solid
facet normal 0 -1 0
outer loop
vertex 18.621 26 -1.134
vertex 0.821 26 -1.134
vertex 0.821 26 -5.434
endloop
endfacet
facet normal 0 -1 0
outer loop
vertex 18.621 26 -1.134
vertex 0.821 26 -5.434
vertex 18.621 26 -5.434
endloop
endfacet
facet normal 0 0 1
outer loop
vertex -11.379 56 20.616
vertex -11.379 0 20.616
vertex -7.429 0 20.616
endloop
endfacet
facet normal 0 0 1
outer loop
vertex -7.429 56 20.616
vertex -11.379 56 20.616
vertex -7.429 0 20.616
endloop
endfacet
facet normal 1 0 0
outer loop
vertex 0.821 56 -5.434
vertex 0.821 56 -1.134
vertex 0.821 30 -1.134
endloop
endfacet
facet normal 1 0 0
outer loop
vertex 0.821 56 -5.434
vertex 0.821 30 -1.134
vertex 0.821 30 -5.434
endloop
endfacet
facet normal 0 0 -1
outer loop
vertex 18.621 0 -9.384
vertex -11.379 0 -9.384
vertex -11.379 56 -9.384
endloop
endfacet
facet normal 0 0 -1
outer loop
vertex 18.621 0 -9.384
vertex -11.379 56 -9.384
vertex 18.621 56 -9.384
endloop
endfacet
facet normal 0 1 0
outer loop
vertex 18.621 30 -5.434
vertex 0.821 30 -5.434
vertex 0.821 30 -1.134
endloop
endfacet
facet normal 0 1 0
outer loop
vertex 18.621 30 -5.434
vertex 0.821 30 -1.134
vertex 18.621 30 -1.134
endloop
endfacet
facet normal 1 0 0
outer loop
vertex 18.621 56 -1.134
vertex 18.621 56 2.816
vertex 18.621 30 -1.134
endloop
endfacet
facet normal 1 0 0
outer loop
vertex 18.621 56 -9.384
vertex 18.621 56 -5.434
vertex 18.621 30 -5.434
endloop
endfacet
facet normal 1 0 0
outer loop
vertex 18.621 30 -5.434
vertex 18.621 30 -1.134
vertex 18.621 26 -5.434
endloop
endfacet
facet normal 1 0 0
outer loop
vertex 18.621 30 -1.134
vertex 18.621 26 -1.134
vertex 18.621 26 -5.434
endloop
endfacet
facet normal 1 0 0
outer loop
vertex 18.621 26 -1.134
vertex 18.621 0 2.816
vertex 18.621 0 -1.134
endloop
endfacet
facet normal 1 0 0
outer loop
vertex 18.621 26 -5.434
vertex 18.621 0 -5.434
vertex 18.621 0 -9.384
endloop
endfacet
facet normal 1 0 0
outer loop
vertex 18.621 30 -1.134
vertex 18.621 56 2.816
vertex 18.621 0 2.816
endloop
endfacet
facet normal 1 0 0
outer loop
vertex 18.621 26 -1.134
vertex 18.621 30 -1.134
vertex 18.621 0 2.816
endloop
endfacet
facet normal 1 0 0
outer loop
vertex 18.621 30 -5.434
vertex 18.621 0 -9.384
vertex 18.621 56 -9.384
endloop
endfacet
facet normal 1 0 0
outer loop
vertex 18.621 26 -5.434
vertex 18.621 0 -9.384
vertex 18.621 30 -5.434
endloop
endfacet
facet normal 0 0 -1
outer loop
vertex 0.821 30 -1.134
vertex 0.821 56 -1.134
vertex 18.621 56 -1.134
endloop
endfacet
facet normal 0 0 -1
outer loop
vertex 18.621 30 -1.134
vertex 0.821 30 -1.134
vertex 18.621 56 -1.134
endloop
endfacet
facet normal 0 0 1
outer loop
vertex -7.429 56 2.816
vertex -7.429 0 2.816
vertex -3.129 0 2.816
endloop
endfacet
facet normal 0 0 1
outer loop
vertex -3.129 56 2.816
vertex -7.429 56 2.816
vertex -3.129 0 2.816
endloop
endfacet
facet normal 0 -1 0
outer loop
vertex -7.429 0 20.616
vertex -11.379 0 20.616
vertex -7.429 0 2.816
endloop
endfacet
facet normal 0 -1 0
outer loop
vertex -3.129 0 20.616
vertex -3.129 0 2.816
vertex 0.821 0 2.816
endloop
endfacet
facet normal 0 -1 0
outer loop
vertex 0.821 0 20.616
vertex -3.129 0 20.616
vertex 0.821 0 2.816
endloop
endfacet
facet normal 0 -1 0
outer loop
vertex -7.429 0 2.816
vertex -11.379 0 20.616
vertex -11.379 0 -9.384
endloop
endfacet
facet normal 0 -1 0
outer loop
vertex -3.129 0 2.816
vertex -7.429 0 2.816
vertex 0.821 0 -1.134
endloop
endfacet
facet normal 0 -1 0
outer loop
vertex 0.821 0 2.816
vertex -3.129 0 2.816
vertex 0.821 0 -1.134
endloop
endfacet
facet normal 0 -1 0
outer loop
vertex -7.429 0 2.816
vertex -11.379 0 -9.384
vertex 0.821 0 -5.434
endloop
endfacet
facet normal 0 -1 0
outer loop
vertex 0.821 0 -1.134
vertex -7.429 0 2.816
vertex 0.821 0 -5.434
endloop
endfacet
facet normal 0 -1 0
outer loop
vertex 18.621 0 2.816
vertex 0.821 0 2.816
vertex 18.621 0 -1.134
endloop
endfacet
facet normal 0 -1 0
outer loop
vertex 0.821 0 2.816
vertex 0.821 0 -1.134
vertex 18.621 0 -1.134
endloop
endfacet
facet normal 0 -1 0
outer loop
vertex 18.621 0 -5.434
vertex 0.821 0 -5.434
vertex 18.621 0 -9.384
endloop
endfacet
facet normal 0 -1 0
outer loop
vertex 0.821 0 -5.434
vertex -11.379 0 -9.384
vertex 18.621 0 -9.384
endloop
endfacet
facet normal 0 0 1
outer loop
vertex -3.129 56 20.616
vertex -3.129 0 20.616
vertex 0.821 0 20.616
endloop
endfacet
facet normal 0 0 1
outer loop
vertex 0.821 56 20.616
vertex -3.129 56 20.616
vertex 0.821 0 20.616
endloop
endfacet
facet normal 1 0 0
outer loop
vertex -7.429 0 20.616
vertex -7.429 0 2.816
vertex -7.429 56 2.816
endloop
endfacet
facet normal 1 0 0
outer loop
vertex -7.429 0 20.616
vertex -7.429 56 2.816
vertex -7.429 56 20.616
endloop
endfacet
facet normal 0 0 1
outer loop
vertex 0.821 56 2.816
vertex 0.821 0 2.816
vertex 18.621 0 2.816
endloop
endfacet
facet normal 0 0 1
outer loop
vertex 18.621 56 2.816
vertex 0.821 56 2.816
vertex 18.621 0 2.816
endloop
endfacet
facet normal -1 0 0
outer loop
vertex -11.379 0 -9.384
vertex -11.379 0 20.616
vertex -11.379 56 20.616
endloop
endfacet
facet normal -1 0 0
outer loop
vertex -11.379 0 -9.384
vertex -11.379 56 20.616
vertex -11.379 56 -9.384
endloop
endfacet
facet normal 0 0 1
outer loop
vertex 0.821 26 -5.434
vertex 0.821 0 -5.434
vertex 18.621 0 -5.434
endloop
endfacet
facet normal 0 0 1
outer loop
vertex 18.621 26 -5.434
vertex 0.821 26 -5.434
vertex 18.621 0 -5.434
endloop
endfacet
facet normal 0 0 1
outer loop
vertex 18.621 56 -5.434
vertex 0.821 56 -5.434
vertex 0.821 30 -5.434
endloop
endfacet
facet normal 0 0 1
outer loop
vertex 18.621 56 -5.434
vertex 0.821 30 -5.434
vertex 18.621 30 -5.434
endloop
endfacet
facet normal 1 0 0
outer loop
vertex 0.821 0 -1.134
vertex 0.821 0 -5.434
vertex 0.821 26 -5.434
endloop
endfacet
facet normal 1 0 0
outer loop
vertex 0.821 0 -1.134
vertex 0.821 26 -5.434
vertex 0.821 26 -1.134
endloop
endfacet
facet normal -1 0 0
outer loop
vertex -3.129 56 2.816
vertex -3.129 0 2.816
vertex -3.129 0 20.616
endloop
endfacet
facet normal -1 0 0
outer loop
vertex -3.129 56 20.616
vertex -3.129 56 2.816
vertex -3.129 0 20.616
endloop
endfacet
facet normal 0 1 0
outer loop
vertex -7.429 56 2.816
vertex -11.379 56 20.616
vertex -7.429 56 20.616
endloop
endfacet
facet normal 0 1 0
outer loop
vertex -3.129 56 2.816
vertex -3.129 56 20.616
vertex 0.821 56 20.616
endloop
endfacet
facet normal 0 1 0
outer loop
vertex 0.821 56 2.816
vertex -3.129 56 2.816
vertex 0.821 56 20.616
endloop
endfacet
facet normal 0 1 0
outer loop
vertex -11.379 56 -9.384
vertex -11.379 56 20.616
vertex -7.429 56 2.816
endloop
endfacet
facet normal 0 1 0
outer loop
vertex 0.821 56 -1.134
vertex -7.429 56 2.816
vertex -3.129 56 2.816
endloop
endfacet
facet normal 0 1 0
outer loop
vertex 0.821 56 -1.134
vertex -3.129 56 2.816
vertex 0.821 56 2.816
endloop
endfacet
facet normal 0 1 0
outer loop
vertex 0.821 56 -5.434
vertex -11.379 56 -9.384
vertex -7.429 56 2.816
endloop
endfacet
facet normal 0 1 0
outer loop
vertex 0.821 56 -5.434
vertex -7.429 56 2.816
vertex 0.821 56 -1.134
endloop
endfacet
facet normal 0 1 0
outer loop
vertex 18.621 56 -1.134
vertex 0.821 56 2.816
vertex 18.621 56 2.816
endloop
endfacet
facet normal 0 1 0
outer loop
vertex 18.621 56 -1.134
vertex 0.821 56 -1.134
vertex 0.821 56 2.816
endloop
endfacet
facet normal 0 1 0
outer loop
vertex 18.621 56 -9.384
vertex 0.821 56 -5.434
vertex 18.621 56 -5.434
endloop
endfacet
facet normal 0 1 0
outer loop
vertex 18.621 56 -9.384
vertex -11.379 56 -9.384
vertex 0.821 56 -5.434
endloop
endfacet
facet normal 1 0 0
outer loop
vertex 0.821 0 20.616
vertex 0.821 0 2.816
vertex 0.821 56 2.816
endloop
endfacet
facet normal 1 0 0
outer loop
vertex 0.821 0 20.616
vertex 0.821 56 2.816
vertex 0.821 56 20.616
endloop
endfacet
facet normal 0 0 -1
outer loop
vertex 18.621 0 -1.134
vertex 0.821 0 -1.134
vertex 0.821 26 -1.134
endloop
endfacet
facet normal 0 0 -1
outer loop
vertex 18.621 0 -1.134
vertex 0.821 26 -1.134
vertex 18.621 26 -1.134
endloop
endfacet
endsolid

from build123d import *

# Parameters (mm, degrees)
ESQUISSE1_W             = 30
ESQUISSE1_H             = 30
BOSS_EXTRU_1_DEPTH      = 56
ESQUISSE2_W             = 17.8
ESQUISSE2_H             = 4.3
ENL_V_MAT_EXTRU_1_DEPTH = 26
ESQUISSE3_W             = 4.3
ESQUISSE3_H             = 17.8
ESQUISSE3_W_2           = 17.8
ENL_V_MAT_EXTRU_2_DEPTH = 57
ESQUISSE4_W             = 17.8
ESQUISSE4_H             = 4.3
ENL_V_MAT_EXTRU_3_DEPTH = 26


with BuildPart() as part:
    # Esquisse1 → Boss.-Extru.1 (new body)
    with BuildSketch(Plane(origin=(0, 0, 0), x_dir=(1, 0, 0), z_dir=(0, 1, 0))):
        with Locations((3.620689655, -5.615763547)):
            Rectangle(ESQUISSE1_W, ESQUISSE1_H)
    extrude(amount=BOSS_EXTRU_1_DEPTH)

    # Esquisse2 → Enlèv. mat.-Extru.1 (cut)
    with BuildSketch(Plane.XZ):
        with Locations((9.720689655, -3.284236453)):
            Rectangle(ESQUISSE2_W, ESQUISSE2_H)
    extrude(amount=-ENL_V_MAT_EXTRU_1_DEPTH, mode=Mode.SUBTRACT)

    # Esquisse3 → Enlèv. mat.-Extru.2 (cut, through all)
    with BuildSketch(Plane.XZ):
        with Locations((-5.279310345, 11.715763547)):
            Rectangle(ESQUISSE3_W, ESQUISSE3_H)
        with Locations((9.720689655, 11.715763547)):
            Rectangle(ESQUISSE3_W_2, ESQUISSE3_H)
    extrude(amount=-ENL_V_MAT_EXTRU_2_DEPTH, mode=Mode.SUBTRACT)

    # Esquisse4 → Enlèv. mat.-Extru.3 (cut)
    with BuildSketch(Plane(origin=(0, 56, 0), x_dir=(1, 0, 0), z_dir=(0, 1, 0))):
        with Locations((9.720689655, 3.284236453)):
            Rectangle(ESQUISSE4_W, ESQUISSE4_H)
    extrude(amount=-ENL_V_MAT_EXTRU_3_DEPTH, mode=Mode.SUBTRACT)


solid = part.part
